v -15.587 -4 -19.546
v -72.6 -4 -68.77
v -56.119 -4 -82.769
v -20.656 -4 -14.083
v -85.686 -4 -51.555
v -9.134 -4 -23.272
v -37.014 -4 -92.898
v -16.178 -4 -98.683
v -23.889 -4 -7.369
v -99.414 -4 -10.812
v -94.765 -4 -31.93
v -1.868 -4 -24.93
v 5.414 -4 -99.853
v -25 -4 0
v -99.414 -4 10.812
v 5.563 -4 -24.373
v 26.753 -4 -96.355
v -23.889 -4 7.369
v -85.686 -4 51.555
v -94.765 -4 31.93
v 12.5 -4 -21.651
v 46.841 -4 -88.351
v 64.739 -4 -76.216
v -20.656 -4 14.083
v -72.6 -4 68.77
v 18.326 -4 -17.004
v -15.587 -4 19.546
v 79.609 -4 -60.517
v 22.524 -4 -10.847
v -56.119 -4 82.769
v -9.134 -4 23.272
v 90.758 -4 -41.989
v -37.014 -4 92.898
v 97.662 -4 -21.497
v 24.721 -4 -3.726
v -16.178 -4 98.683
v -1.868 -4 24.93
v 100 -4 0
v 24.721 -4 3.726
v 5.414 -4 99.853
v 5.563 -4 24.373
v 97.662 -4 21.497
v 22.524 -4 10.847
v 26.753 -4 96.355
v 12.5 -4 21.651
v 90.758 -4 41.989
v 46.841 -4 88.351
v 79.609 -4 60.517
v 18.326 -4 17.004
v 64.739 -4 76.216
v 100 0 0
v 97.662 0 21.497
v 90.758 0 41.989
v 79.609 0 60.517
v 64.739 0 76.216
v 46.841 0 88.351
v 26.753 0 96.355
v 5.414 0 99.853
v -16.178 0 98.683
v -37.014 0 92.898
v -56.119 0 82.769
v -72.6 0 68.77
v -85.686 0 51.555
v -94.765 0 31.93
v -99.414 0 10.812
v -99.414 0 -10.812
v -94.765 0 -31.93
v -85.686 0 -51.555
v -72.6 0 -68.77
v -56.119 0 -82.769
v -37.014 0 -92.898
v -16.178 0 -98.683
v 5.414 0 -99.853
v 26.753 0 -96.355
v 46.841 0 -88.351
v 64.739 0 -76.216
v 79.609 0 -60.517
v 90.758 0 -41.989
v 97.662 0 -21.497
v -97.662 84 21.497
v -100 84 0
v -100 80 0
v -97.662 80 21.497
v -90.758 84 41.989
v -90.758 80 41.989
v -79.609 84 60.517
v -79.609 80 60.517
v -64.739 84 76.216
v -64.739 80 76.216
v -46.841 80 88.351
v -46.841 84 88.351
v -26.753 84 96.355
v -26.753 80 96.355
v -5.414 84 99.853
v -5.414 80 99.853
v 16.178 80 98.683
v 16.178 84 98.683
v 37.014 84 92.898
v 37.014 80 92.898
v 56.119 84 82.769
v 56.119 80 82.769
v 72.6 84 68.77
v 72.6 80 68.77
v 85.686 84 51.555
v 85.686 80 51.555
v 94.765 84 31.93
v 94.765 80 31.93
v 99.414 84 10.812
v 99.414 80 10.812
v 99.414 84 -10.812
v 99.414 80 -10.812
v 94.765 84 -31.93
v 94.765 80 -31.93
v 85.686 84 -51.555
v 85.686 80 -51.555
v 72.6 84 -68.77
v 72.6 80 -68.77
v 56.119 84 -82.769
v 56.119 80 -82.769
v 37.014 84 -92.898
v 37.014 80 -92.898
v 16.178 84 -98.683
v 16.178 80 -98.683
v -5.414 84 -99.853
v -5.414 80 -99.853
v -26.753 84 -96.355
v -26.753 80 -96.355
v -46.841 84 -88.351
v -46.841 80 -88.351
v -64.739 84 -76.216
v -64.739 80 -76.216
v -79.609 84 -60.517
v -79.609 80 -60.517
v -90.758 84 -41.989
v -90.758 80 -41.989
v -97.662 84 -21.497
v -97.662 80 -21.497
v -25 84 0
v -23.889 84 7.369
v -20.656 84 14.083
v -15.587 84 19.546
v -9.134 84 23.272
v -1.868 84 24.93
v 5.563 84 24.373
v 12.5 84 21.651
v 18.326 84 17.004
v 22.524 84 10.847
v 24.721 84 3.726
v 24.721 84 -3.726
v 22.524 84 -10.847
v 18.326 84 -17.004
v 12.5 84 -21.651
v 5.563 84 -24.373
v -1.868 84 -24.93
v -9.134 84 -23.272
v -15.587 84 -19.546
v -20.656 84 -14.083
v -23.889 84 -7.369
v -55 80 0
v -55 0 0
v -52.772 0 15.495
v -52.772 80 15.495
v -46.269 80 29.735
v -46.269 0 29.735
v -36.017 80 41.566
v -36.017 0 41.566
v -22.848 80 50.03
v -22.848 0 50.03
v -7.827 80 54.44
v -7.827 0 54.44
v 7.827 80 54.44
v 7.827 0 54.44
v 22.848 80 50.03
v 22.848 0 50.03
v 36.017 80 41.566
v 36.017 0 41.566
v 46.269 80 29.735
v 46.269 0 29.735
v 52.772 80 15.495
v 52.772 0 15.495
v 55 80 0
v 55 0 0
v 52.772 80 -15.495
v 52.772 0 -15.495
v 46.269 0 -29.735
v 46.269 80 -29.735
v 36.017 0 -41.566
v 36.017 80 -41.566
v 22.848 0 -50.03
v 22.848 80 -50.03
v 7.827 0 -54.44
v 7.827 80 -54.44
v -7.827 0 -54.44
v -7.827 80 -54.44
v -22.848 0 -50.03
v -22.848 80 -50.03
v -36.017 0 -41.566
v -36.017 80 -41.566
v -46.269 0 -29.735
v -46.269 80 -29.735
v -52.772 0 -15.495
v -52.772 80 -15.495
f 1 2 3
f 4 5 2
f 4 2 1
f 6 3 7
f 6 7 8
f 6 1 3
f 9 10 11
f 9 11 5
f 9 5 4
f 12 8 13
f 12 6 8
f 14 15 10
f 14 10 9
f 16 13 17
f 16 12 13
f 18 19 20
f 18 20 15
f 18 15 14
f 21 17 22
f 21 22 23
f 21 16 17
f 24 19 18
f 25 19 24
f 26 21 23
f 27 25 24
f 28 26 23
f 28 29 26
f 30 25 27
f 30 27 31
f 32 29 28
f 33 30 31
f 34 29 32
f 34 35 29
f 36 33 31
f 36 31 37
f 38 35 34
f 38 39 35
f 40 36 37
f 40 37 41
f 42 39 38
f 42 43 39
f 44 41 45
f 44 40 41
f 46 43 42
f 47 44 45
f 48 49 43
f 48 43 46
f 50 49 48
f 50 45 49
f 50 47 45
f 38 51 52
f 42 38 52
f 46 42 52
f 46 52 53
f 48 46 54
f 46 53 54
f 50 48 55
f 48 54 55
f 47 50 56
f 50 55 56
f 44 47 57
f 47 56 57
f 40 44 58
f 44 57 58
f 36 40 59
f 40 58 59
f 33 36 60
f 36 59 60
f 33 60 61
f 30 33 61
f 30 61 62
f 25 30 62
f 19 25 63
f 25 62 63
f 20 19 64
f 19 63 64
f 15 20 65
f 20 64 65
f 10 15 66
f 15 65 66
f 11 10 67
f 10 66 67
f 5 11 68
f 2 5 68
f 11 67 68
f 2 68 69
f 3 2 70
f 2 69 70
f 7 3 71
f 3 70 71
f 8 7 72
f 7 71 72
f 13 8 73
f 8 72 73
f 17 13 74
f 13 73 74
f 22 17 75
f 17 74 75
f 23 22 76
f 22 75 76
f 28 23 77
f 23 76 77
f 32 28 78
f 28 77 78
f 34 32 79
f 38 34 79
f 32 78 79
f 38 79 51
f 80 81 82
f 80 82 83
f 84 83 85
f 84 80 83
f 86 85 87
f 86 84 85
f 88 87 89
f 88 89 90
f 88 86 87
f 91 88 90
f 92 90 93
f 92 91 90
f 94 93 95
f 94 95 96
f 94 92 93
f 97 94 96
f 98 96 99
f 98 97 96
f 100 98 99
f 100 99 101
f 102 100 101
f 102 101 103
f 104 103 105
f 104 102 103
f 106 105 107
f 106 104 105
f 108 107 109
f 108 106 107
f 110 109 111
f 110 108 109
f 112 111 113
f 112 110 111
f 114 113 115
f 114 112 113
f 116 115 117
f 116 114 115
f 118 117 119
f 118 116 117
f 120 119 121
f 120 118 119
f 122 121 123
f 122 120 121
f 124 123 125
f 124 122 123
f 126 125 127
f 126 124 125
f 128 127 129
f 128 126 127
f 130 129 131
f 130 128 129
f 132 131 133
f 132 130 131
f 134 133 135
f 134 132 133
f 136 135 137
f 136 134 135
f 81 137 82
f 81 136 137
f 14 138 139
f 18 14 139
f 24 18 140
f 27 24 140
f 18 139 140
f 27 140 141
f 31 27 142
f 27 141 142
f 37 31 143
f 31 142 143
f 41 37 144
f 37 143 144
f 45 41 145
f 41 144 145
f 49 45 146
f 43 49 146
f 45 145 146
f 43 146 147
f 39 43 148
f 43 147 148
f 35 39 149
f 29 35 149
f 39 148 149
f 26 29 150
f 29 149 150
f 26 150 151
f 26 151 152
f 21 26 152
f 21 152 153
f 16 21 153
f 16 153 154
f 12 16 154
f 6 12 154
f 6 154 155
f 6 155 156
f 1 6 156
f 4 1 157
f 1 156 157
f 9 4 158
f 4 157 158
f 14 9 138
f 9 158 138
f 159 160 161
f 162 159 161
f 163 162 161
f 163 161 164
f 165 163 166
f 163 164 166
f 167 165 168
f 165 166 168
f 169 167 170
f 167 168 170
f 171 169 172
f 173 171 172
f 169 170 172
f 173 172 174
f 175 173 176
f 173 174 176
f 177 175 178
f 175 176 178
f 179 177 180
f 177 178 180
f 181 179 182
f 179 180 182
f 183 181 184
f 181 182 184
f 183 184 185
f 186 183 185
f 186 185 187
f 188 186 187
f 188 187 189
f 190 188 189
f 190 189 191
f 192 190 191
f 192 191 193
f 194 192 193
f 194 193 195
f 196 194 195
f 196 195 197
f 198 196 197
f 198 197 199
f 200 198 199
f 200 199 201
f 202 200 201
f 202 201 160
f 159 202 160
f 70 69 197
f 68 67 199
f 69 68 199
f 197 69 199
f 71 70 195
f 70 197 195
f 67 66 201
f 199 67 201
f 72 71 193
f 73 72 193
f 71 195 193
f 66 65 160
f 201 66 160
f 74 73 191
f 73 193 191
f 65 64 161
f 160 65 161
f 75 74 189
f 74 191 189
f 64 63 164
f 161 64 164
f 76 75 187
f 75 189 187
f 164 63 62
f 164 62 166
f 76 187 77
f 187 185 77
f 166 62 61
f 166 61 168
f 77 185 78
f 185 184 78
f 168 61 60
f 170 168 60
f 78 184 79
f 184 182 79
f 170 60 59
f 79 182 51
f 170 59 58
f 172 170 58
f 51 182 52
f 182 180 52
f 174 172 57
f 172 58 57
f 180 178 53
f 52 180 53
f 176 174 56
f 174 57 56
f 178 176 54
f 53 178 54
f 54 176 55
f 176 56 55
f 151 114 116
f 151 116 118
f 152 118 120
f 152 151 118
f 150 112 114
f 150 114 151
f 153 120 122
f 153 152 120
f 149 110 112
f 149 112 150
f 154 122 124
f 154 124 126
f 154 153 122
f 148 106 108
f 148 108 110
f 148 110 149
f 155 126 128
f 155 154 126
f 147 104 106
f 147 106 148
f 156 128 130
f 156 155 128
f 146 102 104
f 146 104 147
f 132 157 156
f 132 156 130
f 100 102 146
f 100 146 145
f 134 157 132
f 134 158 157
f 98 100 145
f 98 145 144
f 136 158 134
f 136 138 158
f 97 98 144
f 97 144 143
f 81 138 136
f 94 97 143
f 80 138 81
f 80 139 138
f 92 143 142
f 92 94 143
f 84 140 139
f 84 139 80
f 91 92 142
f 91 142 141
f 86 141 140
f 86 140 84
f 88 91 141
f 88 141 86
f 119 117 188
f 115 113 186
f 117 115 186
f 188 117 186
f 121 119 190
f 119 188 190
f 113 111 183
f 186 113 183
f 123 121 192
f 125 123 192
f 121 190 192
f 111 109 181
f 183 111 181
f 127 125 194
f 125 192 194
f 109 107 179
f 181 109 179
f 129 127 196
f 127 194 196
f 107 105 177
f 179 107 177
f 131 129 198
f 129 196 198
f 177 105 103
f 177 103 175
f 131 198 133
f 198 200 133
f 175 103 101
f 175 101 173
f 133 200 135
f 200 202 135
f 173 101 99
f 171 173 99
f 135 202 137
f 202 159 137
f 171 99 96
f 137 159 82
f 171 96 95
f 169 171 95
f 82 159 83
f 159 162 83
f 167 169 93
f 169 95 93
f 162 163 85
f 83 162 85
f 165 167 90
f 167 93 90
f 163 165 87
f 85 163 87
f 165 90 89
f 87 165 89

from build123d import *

# Parameters (mm, degrees)
F0_R     = 100
F1_DEPTH = 4
F2_R     = 55
F3_DEPTH = 84
F4_R     = 100
F4_R_2   = 55
F5_DEPTH = 4
F6_R     = 25
F7_DEPTH = 88


with BuildPart() as f1:
    # F0 (on Front) → F1 (new body)
    with BuildSketch(Plane.XZ):
        Circle(F0_R)
    extrude(amount=F1_DEPTH)

    # F2 (on face) → F3 (join)
    with BuildSketch(Plane(origin=(0, 0, 0), x_dir=(-1, 0, 0), z_dir=(0, 1, 0))):
        Circle(F2_R)
    extrude(amount=F3_DEPTH)

    # F4 (on face) → F5 (join)
    with BuildSketch(Plane(origin=(0, 84, 0), x_dir=(-1, 0, 0), z_dir=(0, 1, 0))):
        Circle(F4_R)
        Circle(F4_R_2, mode=Mode.SUBTRACT)
    extrude(amount=-F5_DEPTH)

    # F6 (on face) → F7 (cut, through all)
    with BuildSketch(Plane(origin=(0, 84, 0), x_dir=(-1, 0, 0), z_dir=(0, 1, 0))):
        Circle(F6_R)
    extrude(amount=-F7_DEPTH, mode=Mode.SUBTRACT)


solid = f1.part
